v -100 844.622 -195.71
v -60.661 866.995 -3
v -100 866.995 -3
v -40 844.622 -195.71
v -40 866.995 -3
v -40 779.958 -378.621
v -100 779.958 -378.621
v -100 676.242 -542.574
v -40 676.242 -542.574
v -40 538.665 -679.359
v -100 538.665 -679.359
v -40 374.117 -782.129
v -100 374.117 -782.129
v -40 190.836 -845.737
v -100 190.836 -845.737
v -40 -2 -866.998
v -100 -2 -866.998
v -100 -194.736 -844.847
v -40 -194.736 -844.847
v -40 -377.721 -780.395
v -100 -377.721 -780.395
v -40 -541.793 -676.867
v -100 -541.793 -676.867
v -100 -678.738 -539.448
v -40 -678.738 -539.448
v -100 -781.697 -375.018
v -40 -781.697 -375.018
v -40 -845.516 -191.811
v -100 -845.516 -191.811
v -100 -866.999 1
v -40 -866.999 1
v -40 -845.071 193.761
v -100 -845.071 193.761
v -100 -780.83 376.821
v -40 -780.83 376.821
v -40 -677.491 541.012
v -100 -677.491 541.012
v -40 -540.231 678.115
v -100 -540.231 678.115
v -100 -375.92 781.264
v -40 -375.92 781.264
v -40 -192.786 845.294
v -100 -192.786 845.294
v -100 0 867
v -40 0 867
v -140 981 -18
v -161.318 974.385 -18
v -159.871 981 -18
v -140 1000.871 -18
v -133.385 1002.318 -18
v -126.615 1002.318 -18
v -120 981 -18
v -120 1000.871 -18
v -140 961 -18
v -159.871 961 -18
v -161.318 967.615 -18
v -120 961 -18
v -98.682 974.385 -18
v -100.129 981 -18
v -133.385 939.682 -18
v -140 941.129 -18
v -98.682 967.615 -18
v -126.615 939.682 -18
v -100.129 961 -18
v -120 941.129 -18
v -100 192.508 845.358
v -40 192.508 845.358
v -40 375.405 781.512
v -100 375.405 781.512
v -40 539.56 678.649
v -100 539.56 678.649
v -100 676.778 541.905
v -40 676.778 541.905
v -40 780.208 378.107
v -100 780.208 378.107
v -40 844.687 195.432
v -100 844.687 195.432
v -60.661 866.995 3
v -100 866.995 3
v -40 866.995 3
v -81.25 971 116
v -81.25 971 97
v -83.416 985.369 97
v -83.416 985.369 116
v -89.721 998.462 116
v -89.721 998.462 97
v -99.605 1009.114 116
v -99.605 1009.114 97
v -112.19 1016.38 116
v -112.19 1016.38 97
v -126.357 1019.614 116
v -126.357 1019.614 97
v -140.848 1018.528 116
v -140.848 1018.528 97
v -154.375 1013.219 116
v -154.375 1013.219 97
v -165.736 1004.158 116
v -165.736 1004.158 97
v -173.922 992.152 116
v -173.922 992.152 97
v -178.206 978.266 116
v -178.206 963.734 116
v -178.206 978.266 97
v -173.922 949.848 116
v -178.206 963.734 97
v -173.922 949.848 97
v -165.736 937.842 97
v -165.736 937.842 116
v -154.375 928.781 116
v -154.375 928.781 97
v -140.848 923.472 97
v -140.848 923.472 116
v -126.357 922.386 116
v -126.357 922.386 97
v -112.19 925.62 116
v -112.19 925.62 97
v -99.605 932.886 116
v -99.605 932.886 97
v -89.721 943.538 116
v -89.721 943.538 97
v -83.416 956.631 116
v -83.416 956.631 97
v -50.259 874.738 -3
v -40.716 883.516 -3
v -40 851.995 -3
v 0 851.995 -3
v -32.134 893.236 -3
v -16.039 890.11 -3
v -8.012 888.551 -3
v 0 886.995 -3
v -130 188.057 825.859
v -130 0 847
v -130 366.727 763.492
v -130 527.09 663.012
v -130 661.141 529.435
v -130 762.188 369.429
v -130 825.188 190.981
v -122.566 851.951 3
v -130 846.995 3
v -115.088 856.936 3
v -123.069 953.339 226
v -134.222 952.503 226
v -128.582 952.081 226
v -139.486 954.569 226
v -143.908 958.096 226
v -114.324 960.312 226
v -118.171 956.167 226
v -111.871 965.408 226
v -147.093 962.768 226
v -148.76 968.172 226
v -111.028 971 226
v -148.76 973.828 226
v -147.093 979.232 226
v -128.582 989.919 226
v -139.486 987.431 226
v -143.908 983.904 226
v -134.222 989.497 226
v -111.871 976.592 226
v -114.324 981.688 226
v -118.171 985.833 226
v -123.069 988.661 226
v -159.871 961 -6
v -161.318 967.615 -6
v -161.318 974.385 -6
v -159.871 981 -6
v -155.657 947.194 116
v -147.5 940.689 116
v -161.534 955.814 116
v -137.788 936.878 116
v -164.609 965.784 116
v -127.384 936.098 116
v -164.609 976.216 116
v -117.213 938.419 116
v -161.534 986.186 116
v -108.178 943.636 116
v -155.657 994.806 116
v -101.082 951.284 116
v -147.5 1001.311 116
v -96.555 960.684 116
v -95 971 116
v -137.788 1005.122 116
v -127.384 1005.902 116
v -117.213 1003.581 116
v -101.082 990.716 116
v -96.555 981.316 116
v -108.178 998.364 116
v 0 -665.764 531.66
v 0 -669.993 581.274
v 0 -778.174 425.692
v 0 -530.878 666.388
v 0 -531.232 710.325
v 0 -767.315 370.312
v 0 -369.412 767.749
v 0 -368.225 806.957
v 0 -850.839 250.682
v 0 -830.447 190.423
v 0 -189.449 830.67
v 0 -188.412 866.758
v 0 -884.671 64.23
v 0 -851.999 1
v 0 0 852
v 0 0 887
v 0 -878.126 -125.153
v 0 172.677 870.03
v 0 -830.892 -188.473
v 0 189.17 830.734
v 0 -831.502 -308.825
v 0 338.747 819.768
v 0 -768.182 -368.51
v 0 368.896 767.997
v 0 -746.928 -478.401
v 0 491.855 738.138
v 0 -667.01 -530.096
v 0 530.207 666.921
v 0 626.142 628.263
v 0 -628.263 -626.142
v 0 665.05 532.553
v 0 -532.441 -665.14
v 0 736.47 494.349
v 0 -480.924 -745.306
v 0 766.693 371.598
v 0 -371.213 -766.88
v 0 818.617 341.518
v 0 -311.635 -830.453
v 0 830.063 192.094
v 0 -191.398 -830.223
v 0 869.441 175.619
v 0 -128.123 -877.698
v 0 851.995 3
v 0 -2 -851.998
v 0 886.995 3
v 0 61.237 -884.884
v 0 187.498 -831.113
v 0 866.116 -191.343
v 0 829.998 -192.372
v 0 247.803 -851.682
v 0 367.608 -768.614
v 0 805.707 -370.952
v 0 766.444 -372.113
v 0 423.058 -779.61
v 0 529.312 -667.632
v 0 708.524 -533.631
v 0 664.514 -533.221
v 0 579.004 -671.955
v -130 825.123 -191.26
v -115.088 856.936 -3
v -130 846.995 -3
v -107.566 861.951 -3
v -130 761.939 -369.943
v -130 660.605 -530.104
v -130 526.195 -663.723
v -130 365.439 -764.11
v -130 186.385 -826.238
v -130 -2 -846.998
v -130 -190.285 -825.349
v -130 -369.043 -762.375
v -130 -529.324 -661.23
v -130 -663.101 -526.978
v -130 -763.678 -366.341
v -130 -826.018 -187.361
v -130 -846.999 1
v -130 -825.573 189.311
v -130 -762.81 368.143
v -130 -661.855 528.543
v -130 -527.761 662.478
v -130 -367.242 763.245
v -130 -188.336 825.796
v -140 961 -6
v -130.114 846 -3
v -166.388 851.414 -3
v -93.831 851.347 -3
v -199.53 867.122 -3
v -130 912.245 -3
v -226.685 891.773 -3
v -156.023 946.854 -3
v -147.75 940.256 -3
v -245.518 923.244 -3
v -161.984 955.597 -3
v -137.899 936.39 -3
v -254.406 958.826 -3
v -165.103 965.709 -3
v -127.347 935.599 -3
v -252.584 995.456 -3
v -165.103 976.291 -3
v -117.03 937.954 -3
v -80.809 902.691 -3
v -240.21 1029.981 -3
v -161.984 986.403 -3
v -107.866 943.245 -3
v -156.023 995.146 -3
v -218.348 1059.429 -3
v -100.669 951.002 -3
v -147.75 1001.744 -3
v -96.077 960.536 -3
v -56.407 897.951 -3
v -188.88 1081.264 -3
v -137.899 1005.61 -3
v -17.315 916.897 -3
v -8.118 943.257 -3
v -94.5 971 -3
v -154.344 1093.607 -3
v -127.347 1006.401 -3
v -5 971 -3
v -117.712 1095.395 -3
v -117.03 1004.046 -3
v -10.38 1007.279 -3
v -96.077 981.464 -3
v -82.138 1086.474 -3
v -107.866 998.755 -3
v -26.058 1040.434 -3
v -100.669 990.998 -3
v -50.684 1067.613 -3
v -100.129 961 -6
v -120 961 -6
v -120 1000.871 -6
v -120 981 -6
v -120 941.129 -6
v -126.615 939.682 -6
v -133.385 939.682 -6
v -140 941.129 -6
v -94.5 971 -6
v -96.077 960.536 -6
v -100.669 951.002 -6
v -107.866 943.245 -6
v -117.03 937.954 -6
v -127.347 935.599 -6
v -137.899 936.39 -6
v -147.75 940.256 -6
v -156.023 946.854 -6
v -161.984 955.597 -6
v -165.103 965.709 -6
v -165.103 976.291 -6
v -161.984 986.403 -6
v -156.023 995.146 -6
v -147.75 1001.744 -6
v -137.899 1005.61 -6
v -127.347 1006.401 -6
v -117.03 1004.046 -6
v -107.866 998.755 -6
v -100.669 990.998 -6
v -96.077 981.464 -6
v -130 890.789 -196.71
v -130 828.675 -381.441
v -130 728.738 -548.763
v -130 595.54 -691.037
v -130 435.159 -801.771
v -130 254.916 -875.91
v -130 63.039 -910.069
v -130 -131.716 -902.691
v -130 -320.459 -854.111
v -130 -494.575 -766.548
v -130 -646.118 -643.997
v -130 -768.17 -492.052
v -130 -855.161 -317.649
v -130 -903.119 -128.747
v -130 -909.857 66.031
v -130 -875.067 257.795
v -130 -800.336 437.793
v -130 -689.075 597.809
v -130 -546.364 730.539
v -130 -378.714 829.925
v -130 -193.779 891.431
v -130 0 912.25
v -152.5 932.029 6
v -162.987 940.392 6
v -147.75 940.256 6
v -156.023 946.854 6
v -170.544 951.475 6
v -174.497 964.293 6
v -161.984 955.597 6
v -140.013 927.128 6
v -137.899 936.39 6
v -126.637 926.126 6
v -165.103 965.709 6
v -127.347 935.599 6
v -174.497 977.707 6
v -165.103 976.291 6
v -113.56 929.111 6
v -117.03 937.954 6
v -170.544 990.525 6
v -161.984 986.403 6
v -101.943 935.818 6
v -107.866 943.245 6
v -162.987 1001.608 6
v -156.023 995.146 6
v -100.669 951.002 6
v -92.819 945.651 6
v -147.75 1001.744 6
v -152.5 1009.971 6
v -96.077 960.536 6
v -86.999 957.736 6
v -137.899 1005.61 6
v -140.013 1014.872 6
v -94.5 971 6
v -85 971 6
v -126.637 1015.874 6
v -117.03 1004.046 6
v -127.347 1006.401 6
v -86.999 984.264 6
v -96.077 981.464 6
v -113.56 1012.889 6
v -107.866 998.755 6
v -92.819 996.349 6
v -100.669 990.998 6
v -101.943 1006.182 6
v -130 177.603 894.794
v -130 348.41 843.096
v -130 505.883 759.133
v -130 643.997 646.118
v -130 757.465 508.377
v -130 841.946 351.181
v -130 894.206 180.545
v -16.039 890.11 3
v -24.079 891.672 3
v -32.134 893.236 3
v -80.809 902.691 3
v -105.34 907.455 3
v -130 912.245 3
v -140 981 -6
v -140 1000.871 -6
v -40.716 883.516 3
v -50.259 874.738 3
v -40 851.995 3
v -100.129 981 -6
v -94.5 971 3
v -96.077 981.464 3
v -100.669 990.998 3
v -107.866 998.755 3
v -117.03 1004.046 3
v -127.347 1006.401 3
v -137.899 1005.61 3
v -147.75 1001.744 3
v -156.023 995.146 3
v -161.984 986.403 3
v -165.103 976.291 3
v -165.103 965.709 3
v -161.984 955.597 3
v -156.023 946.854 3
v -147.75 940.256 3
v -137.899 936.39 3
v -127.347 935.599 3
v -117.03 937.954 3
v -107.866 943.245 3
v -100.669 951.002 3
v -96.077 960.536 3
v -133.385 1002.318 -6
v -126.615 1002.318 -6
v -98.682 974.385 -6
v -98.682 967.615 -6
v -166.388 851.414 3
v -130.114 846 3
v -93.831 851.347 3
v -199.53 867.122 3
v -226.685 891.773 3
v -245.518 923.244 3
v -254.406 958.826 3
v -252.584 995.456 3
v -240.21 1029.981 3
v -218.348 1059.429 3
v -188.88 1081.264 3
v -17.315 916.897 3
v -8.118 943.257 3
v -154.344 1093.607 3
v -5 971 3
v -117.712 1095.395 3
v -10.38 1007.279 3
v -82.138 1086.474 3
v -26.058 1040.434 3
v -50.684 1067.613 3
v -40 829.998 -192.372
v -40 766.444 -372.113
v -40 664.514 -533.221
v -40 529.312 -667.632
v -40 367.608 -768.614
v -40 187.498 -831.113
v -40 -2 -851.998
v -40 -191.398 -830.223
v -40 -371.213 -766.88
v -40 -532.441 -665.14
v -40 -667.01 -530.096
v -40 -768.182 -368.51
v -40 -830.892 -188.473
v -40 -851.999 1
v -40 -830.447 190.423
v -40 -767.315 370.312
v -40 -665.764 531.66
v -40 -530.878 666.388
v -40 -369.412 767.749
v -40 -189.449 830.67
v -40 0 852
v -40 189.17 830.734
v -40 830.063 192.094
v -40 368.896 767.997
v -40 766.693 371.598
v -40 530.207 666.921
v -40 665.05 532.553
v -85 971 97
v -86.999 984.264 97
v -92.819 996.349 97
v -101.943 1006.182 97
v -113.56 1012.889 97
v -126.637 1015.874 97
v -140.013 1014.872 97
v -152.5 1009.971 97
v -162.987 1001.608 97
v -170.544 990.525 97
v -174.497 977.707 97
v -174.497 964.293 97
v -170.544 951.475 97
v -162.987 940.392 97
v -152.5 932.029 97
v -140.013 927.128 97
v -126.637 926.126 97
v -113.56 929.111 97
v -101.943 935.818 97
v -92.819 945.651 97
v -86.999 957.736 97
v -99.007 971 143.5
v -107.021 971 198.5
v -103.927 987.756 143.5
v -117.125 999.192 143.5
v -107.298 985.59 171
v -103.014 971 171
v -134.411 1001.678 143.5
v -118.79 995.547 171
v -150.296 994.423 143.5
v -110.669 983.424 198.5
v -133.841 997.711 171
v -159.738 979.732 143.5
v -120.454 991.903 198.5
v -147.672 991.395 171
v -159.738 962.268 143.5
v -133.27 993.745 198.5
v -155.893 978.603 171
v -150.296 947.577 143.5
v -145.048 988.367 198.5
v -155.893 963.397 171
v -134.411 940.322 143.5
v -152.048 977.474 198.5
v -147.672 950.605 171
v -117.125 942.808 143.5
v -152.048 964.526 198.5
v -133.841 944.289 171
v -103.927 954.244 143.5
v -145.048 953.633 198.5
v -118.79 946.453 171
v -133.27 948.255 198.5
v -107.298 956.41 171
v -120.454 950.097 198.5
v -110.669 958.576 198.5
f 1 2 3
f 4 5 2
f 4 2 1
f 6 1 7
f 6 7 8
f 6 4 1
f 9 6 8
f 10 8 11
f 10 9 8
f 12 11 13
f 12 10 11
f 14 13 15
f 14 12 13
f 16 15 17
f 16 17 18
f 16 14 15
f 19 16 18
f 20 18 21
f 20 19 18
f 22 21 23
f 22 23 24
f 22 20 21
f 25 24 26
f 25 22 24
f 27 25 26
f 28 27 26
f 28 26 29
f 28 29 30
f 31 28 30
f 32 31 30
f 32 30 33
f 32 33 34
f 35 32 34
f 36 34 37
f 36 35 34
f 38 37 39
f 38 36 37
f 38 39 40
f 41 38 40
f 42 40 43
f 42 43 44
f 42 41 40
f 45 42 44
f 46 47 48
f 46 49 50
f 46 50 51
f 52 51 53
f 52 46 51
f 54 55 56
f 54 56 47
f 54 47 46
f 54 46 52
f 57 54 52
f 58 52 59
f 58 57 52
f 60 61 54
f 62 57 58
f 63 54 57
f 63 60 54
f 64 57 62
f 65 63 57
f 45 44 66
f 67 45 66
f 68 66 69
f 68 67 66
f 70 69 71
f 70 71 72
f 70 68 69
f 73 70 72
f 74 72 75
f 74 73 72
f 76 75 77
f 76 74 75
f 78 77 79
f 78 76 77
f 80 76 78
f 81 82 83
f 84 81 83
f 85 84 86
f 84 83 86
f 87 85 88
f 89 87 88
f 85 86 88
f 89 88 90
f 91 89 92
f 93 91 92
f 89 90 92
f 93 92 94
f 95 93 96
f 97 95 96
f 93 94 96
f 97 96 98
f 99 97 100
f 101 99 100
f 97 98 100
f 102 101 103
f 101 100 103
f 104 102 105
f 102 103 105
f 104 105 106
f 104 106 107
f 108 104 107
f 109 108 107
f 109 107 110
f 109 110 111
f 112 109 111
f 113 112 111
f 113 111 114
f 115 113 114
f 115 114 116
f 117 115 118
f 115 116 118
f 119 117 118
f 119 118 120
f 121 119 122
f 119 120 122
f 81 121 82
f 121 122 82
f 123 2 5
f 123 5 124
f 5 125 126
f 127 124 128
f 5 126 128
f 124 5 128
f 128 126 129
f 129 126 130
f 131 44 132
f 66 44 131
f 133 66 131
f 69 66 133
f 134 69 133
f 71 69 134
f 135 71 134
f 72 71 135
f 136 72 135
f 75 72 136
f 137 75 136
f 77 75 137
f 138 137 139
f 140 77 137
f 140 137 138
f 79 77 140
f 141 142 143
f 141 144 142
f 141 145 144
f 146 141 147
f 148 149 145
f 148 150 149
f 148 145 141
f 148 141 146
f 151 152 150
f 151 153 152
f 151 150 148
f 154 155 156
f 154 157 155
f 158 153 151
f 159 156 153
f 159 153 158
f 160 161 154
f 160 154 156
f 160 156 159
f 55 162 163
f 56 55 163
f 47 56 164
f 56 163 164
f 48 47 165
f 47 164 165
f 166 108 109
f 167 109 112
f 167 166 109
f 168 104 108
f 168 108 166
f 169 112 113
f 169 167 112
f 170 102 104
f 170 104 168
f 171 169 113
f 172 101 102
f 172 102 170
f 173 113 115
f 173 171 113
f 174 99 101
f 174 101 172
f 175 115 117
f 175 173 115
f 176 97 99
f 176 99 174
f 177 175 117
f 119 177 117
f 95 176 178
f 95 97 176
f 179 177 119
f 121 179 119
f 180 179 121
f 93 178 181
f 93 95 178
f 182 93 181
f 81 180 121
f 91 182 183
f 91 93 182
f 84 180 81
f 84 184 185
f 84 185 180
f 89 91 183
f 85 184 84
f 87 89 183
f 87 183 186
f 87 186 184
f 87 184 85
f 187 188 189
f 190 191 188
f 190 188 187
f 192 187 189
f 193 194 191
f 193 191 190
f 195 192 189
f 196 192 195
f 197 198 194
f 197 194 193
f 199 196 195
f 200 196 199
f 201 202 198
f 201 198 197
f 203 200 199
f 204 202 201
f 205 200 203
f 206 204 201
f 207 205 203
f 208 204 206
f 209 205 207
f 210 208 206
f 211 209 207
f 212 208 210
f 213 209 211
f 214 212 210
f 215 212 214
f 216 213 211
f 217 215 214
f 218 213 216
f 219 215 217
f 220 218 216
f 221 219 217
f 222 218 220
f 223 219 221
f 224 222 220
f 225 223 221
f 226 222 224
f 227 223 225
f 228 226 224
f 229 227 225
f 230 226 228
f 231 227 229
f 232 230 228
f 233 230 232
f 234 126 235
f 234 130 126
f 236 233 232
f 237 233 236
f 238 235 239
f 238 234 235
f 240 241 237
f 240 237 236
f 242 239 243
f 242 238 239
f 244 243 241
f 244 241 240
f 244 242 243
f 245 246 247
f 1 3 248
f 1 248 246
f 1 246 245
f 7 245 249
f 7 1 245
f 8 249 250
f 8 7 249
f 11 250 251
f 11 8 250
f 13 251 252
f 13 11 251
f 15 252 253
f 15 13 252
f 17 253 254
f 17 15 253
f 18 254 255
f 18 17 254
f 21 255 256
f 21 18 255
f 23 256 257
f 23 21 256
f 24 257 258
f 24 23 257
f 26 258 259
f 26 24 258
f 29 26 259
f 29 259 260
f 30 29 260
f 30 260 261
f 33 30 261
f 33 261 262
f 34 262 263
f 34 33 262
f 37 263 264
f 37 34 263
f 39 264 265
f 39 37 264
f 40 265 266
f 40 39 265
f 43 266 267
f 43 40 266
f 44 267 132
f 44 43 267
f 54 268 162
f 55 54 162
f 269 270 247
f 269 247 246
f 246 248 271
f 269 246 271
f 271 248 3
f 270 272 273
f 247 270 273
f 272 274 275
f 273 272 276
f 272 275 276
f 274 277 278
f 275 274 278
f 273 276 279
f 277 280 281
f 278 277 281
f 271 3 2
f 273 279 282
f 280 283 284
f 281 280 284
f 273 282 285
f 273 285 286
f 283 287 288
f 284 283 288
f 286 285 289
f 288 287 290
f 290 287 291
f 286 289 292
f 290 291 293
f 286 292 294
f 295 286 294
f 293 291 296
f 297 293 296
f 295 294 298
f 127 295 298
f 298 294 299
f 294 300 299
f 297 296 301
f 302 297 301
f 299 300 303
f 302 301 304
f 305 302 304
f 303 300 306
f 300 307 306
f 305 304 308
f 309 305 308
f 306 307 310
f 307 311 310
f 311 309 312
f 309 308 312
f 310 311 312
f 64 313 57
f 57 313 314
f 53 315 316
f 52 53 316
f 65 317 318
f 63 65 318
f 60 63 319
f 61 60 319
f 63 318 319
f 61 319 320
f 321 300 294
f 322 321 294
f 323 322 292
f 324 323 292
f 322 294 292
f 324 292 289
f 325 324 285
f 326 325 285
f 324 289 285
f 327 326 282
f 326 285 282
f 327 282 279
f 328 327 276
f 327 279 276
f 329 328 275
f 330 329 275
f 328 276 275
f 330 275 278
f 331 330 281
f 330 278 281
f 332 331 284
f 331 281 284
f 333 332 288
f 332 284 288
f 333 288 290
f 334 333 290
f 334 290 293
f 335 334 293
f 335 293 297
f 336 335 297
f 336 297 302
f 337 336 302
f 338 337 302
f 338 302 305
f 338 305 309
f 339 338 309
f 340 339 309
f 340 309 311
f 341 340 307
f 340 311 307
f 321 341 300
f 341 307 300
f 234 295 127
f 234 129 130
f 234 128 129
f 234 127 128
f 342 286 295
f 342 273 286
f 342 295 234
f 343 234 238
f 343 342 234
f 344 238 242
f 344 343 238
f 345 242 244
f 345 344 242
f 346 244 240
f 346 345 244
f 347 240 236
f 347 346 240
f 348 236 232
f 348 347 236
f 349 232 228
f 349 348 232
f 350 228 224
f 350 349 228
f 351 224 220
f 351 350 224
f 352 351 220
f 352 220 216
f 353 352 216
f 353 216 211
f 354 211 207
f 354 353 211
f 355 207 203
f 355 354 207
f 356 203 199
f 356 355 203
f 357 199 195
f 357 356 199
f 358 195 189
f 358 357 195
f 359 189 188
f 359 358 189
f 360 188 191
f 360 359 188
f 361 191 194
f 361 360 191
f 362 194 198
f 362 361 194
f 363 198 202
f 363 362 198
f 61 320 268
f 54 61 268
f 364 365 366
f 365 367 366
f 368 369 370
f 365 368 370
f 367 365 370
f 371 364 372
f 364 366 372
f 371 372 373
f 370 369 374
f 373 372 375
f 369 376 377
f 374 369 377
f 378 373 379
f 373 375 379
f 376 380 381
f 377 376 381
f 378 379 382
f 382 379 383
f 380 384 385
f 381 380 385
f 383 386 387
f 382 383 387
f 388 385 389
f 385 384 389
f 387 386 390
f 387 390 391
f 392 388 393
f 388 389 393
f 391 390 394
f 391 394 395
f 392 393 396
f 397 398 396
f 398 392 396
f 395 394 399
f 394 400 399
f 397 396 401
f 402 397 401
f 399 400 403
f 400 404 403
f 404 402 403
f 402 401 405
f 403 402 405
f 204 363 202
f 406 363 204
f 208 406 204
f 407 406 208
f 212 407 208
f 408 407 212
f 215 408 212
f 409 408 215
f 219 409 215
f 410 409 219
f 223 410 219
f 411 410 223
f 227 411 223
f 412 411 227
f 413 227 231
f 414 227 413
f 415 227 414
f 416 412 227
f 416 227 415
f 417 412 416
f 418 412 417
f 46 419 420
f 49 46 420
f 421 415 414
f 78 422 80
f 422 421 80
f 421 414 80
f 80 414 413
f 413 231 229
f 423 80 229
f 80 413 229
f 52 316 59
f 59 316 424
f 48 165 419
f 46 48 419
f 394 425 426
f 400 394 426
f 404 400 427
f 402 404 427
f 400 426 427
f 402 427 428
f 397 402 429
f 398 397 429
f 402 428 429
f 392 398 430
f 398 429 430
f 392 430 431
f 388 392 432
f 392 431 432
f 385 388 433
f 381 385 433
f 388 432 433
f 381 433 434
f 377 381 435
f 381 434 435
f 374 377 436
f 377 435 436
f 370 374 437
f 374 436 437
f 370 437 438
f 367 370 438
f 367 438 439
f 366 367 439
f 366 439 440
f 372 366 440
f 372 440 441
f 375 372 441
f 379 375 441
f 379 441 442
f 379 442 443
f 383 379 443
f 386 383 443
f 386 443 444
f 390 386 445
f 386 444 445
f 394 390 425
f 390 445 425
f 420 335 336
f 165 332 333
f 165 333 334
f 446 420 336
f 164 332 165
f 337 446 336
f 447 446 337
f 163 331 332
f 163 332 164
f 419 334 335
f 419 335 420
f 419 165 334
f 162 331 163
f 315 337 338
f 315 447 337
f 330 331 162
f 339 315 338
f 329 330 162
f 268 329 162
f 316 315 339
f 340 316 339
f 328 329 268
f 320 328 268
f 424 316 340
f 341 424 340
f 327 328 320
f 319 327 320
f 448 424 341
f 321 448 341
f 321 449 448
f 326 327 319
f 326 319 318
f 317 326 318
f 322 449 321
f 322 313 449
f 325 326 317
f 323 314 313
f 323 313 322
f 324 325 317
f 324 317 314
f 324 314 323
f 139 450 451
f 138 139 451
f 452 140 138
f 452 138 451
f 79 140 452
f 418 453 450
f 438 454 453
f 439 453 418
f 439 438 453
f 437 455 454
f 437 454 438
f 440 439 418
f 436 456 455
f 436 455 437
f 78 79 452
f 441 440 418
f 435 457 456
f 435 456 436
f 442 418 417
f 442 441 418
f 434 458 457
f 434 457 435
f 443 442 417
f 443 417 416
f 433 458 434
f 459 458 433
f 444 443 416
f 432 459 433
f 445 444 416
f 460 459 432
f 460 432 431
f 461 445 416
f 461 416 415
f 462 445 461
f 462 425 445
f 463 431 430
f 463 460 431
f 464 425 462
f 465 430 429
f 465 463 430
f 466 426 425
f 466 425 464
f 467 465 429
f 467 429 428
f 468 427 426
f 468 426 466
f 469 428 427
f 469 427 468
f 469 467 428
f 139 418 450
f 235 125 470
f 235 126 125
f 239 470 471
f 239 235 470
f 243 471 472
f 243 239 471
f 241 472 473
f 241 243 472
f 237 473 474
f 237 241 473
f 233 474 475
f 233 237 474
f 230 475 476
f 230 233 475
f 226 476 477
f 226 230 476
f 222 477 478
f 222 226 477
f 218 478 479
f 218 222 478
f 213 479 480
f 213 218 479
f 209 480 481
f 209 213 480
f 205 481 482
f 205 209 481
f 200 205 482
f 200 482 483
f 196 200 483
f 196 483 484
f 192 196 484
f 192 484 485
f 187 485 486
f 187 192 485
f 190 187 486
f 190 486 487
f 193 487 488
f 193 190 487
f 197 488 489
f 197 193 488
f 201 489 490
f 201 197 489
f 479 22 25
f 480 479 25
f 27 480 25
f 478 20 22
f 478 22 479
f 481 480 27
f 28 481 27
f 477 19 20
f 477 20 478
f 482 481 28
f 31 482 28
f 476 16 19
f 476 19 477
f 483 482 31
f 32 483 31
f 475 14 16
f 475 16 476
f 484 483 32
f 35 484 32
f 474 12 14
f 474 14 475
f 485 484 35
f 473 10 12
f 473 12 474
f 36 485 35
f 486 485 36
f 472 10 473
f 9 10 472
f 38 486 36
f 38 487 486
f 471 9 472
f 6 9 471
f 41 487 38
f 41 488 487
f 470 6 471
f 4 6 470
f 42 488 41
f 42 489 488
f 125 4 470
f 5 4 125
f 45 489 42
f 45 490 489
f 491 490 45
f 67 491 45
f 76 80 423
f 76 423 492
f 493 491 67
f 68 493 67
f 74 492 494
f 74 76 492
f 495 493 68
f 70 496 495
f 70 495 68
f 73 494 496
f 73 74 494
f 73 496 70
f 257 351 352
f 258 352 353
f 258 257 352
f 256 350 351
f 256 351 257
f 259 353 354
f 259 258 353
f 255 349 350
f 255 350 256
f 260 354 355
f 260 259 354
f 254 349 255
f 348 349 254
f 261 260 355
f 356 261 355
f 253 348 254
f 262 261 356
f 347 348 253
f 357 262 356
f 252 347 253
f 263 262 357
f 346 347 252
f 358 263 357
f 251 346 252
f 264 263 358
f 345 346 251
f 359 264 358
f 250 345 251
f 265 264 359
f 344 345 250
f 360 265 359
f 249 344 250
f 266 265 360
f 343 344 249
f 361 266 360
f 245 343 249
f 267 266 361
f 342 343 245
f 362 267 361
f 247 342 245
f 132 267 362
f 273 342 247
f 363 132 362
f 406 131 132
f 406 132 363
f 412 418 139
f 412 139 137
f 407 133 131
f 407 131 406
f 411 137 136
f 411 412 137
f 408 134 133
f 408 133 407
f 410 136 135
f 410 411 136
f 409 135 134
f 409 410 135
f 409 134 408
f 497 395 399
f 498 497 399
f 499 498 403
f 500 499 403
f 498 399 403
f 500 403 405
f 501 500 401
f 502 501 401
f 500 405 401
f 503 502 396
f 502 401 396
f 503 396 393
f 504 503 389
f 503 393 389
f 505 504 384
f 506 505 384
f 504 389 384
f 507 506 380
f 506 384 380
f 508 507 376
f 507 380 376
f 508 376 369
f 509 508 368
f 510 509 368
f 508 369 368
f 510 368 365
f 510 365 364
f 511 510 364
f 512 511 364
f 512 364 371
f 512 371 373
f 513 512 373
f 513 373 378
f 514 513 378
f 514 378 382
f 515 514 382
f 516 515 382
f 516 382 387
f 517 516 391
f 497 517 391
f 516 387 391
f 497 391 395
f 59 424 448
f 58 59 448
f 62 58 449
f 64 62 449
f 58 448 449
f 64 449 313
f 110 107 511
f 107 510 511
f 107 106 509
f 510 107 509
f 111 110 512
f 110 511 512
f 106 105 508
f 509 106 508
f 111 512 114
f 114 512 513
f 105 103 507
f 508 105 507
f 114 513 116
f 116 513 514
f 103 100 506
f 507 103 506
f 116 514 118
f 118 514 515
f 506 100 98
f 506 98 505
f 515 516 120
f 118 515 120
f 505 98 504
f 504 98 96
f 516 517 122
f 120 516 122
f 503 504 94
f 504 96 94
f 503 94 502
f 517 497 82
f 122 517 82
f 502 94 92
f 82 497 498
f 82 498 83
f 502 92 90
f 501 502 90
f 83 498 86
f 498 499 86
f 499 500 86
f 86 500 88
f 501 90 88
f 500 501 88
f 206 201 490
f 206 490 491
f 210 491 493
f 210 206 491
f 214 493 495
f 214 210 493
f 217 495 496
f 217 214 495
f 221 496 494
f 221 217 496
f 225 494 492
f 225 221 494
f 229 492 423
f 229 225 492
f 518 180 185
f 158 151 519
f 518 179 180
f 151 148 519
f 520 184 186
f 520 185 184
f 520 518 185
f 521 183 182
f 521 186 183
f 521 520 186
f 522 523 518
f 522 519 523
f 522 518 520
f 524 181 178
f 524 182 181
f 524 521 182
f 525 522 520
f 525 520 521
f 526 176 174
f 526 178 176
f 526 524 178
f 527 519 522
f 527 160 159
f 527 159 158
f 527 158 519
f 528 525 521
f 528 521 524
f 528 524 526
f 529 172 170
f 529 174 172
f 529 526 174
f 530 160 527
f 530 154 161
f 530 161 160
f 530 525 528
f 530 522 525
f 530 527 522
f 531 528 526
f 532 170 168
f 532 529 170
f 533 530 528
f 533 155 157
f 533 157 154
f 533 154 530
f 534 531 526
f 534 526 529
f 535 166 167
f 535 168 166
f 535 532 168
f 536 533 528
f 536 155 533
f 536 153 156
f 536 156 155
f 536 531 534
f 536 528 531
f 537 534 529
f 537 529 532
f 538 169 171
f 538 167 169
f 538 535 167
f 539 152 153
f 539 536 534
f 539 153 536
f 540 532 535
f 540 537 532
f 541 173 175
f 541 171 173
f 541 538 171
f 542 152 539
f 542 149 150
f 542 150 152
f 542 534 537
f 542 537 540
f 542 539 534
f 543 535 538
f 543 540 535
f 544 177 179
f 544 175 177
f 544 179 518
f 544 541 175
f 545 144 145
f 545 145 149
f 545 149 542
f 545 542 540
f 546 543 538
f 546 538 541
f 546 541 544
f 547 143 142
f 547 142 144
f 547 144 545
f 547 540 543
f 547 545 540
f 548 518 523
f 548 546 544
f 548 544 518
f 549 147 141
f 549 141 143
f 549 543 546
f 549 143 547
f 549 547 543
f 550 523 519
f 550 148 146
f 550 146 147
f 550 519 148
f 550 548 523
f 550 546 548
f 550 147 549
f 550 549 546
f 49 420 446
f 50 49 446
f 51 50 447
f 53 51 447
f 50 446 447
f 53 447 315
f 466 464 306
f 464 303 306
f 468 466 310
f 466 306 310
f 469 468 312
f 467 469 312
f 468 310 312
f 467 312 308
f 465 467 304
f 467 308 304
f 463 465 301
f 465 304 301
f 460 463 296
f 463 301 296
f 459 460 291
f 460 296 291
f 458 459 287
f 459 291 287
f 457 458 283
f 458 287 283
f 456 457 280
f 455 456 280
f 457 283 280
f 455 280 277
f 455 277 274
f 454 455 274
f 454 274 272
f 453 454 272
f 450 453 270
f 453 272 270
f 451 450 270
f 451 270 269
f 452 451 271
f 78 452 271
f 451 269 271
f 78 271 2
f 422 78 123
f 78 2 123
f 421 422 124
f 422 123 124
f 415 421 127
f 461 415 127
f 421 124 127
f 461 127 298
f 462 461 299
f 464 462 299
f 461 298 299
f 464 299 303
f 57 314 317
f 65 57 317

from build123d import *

# Parameters (mm, degrees)
F3_DEPTH      = 130
F4_R          = 125
F5_DEPTH      = 3
F5_DEPTH_BACK = 3
F6_R          = 35.5
F7_DEPTH      = 3
F8_R          = 35.5
F9_DEPTH      = 3
F10_R         = 45
F11_DEPTH     = 91
F12_R         = 48.75
F13_DEPTH     = 19
F14_R         = 35
F15_DEPTH     = 110
F15_TAPER     = 8.29
F17_DEPTH     = 12


with BuildPart() as f1:
    # F0 (on Front) → F1 (revolve)
    with BuildSketch(Plane.XZ):
        Polygon((-40, 852), (0, 852), (0, 887), (-130, 912.25), (-130, 847), (-100, 867), (-40, 867), align=None)
    revolve(axis=Axis((-281.5768346616, 0, 0), (-1, 0, 0)))

    # F2 (on Right) → F3 (cut)
    with BuildSketch(Plane.YZ):
        Polygon((919.148504734, -3), (919.148504734, 0), (919.148504734, 3), (567.0236367701, 3), (567.0236367701, -3), align=None)
    extrude(amount=-F3_DEPTH, mode=Mode.SUBTRACT)

    # F4 (on Top) → F5 (join, two sides)
    with BuildSketch(Plane.XY) as f5_sk:
        with Locations((-130, 971)):
            Circle(F4_R)
    extrude(amount=-F5_DEPTH)
    extrude(f5_sk.sketch, amount=F5_DEPTH_BACK)

    # F6 (on face) → F7 (join)
    with BuildSketch(Plane.XY.offset(3)):
        with Locations((-130, 971)):
            Circle(F6_R)
    extrude(amount=F7_DEPTH)

    # F8 (on face) → F9 (join)
    with BuildSketch(Plane(origin=(0, 0, -3), x_dir=(1, 0, 0), z_dir=(0, 0, -1))):
        with Locations((-130, -971)):
            Circle(F8_R)
    extrude(amount=F9_DEPTH)

    # F10 (on face) → F11 (join)
    with BuildSketch(Plane.XY.offset(6)):
        with Locations((-130, 971)):
            Circle(F10_R)
    extrude(amount=F11_DEPTH)

    # F12 (on face) → F13 (join)
    with BuildSketch(Plane.XY.offset(97)):
        with Locations((-130, 971)):
            Circle(F12_R)
    extrude(amount=F13_DEPTH)

    # F14 (on face) → F15 (join)
    with BuildSketch(Plane.XY.offset(116)):
        with Locations((-130, 971)):
            Circle(F14_R)
    extrude(amount=F15_DEPTH, taper=F15_TAPER)

    # F16 (on face) → F17 (join)
    with BuildSketch(Plane(origin=(0, 0, -6), x_dir=(1, 0, 0), z_dir=(0, 0, -1))):
        with BuildLine():
            Line((-120, -961), (-120, -941.1294459375))
            ThreePointArc((-120, -941.1294459375), (-130, -939.5), (-140, -941.1294459375))
            Line((-140, -941.1294459375), (-140, -961))
            Line((-140, -961), (-159.8705540625, -961))
            ThreePointArc((-159.8705540625, -961), (-161.5, -971), (-159.8705540625, -981))
            Line((-159.8705540625, -981), (-140, -981))
            Line((-140, -981), (-140, -1000.8705540625))
            ThreePointArc((-140, -1000.8705540625), (-130, -1002.5), (-120, -1000.8705540625))
            Line((-120, -1000.8705540625), (-120, -981))
            Line((-120, -981), (-100.1294459375, -981))
            ThreePointArc((-100.1294459375, -981), (-98.5, -971), (-100.1294459375, -961))
            Line((-100.1294459375, -961), (-120, -961))
        make_face()
    extrude(amount=F17_DEPTH)


solid = f1.part
